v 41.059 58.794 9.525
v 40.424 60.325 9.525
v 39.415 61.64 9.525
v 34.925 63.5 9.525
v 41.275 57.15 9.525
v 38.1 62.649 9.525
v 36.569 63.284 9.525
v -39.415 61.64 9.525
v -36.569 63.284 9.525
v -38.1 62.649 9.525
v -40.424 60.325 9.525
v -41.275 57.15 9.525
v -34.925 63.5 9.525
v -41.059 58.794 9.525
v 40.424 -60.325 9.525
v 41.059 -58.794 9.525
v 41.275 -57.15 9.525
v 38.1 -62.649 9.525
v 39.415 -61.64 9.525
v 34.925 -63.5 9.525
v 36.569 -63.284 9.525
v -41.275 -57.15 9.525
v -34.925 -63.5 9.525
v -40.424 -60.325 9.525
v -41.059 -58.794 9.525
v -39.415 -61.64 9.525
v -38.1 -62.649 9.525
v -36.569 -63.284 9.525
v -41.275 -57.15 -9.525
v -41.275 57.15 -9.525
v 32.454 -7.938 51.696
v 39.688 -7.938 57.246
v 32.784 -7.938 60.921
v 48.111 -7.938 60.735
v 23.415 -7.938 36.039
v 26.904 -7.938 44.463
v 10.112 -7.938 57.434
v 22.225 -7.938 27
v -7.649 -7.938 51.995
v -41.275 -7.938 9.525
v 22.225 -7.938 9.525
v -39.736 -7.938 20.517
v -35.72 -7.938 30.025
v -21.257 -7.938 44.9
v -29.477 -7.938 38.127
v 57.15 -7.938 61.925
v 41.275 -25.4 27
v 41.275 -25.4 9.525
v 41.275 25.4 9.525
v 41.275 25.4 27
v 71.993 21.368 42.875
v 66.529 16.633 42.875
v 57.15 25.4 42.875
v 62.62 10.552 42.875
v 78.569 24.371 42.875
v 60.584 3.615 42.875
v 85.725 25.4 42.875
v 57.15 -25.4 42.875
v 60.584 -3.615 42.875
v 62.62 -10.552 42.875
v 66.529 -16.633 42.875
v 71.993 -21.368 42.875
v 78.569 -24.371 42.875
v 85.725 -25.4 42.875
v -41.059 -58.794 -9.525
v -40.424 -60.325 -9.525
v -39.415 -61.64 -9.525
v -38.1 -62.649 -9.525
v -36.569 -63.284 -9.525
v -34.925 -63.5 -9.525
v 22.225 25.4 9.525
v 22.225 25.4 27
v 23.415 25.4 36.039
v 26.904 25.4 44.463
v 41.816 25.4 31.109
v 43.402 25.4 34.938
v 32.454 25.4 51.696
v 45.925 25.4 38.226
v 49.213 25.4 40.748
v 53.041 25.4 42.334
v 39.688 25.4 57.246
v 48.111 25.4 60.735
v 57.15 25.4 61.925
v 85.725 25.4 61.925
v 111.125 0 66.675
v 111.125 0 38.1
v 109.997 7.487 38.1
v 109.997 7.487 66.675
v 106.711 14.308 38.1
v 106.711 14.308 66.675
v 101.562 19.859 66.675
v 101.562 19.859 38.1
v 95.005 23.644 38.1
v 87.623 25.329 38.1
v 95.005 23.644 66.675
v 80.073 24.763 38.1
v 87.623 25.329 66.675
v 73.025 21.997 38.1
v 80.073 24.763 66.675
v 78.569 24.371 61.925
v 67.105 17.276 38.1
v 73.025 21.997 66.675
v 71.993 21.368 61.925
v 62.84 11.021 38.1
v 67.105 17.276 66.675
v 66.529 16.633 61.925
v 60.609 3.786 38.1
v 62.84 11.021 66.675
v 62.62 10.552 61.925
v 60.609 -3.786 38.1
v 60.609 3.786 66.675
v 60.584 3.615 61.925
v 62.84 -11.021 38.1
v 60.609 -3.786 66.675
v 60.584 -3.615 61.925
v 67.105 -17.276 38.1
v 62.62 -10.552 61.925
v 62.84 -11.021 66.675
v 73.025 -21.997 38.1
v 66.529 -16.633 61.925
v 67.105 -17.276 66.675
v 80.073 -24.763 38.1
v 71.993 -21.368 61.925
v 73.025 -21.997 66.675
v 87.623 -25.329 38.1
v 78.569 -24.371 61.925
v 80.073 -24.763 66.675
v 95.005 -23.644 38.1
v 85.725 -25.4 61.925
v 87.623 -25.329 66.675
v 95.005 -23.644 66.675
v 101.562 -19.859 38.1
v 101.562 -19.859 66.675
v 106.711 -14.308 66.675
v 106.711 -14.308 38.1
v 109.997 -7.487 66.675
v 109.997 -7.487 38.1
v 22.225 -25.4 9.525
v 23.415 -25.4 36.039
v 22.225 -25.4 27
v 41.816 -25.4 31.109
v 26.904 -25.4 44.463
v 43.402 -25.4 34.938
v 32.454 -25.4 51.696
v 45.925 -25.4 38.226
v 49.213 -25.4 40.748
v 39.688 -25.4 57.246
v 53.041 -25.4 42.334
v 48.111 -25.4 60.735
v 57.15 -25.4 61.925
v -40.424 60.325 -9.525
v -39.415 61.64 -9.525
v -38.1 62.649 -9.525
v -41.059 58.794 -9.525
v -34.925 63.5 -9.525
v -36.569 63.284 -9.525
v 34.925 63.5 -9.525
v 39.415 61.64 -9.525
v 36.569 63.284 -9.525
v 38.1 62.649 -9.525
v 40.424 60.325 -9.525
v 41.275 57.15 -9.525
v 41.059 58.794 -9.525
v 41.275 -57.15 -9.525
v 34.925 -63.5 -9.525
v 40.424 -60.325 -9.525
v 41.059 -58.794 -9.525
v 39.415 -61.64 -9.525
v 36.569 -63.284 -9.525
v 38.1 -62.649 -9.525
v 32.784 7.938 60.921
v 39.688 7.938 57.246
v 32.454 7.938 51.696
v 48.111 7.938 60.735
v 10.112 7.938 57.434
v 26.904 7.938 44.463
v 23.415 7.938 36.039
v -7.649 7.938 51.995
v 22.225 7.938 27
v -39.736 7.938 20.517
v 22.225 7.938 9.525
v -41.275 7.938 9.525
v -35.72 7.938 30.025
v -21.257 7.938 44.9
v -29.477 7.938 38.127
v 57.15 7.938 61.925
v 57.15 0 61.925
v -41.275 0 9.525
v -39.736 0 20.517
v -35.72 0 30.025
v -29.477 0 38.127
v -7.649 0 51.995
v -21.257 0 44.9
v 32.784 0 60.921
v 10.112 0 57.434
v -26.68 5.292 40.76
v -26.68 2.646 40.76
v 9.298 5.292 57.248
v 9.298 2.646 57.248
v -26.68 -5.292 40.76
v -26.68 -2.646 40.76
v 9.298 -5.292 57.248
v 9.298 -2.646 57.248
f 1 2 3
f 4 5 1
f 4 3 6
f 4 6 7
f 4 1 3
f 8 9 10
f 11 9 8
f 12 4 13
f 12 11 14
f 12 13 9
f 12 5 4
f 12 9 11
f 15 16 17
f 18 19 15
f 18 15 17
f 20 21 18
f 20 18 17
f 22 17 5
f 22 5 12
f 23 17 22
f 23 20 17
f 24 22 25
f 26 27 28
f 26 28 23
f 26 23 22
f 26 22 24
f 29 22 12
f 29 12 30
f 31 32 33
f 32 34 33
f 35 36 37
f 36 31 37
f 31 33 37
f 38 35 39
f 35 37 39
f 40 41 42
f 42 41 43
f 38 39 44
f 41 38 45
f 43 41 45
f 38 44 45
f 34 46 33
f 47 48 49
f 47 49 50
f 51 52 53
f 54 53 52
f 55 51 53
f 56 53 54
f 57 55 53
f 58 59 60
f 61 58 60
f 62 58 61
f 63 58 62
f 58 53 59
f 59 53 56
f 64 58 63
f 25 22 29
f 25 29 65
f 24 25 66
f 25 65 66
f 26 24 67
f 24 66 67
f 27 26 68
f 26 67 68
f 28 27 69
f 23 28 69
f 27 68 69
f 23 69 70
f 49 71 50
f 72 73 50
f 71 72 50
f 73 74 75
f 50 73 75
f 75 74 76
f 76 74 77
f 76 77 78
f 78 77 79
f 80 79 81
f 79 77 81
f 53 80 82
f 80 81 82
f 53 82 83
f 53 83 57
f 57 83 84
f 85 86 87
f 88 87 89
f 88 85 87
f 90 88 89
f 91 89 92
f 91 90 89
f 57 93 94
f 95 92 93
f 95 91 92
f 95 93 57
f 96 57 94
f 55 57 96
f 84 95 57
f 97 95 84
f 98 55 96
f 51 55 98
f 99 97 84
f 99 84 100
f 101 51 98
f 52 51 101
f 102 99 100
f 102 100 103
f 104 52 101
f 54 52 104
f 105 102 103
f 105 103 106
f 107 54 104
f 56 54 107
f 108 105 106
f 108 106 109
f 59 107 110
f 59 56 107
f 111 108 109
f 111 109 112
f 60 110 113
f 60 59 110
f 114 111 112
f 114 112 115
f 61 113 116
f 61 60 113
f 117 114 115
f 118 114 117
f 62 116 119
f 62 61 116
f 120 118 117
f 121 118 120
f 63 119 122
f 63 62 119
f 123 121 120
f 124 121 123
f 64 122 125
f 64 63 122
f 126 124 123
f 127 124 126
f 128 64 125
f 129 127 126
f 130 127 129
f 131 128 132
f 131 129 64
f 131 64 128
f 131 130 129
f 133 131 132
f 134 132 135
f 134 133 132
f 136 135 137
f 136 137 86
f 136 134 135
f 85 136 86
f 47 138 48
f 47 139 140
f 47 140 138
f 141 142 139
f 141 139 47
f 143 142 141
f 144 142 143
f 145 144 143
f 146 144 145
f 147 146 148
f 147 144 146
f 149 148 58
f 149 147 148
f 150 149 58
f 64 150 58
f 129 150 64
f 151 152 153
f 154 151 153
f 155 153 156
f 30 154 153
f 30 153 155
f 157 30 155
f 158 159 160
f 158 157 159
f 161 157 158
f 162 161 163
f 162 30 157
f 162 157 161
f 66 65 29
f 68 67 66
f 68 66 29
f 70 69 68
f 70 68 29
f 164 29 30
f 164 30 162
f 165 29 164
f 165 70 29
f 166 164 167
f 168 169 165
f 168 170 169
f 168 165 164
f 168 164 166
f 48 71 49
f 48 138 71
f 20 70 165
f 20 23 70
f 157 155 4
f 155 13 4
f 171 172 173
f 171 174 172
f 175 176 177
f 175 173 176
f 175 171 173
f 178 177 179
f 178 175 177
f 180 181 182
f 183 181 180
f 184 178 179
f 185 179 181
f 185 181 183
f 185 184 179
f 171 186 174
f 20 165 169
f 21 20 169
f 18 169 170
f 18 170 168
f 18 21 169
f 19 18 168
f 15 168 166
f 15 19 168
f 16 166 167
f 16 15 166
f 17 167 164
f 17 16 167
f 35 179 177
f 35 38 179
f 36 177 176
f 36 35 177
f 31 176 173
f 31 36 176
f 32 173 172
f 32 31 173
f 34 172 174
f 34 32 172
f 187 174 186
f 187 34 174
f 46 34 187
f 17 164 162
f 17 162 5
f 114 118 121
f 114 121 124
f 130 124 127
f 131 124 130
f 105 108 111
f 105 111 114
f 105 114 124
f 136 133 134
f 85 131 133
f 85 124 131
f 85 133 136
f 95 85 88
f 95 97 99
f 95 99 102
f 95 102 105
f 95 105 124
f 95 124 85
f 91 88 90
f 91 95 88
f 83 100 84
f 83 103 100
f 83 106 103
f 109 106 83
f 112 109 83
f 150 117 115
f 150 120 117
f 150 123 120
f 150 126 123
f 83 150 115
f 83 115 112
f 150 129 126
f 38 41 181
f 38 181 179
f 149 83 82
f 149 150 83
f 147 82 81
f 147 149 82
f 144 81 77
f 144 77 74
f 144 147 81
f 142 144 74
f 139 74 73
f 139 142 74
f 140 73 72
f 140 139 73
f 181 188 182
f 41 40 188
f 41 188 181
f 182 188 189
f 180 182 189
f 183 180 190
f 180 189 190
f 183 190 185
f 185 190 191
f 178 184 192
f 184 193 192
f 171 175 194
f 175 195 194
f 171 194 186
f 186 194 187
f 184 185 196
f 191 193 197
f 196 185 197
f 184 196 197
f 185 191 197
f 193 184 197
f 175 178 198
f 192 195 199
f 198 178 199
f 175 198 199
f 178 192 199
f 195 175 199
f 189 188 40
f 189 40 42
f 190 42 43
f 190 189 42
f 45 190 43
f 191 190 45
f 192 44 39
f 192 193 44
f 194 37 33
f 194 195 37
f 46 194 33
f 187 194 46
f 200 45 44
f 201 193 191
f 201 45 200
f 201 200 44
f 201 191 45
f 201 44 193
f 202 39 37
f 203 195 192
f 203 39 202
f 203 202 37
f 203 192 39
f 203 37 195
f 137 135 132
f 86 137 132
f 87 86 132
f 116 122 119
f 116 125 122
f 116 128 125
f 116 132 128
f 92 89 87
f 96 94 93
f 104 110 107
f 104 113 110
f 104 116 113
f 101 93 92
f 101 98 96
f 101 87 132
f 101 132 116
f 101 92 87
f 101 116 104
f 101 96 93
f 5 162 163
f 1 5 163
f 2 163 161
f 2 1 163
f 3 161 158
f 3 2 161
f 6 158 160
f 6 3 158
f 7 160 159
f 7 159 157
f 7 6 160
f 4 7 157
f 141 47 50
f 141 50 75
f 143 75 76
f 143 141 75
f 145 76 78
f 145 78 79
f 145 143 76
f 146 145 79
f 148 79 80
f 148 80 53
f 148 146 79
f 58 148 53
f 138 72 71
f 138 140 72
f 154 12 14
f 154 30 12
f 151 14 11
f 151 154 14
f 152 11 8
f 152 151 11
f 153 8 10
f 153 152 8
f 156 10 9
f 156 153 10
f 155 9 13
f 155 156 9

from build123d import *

# Parameters (mm, degrees)
F1_DEPTH = 63.5
F2_DEPTH = 7.9375
F0_W     = 25.4
F0_H     = 19.05
F3_DEPTH = 25.4
F5_R     = 6.35


with BuildPart() as f1:
    # F0 (on Front) → F1 (new body, symmetric)
    with BuildSketch(Plane.XZ):
        Polygon((-41.275, -9.525), (41.275, -9.525), (41.275, 9.525), (22.225, 9.525), (-41.275, 9.525), align=None)
    extrude(amount=F1_DEPTH, both=True)

    # F5
    f5_edges = [f1.edges().sort_by_distance(p)[0] for p in [
        (41.275, -63.5, 0),
        (-41.275, -63.5, 0),
        (41.275, 63.5, 0),
        (-41.275, 63.5, 0),
    ]]
    fillet(f5_edges, radius=F5_R)


with BuildPart() as f2:
    # F0 (on Front) → F2 (new body, symmetric)
    with BuildSketch(Plane.XZ):
        with BuildLine():
            add(Edge.make_bspline(
                [(-41.275, 9.525), (-40.5419133604, 49.1128563881), (6.5302411094, 62.1733367443), (57.15, 61.9252)],
                knots=[0, 0, 0, 0, 111.5045361635, 111.5045361635, 111.5045361635, 111.5045361635], degree=3))
            Line((-41.275, 9.525), (22.225, 9.525))
            Line((22.225, 9.525), (22.225, 27.0002))
            ThreePointArc((22.225, 27.0002), (32.4542956671, 51.6959043329), (57.15, 61.9252))
        make_face()
    extrude(amount=F2_DEPTH, both=True)


with BuildPart() as f3:
    # F0 (on Front) → F3 (new body, symmetric)
    with BuildSketch(Plane.XZ):
        with BuildLine():
            Line((22.225, 9.525), (41.275, 9.525))
            Line((41.275, 9.525), (41.275, 27.0002))
            ThreePointArc((41.275, 27.0002), (45.9246798487, 38.2255201513), (57.15, 42.8752))
            Line((57.15, 42.8752), (60.325, 42.8752))
            Line((60.325, 42.8752), (60.325, 61.9252))
            Line((60.325, 61.9252), (57.15, 61.9252))
            ThreePointArc((57.15, 61.9252), (32.4542956671, 51.6959043329), (22.225, 27.0002))
            Line((22.225, 27.0002), (22.225, 9.525))
        make_face()
        with Locations((73.025, 52.4002)):
            Rectangle(F0_W, F0_H)
    extrude(amount=F3_DEPTH, both=True)

    # F0 (on Front) → F4 (revolve)
    with BuildSketch(Plane.XZ):
        Polygon((85.725, 66.675), (85.725, 61.9252), (85.725, 42.8752), (85.725, 38.1), (111.125, 38.1), (111.125, 66.675), align=None)
    revolve(axis=Axis((85.725, 0, 52.3875), (0, 0, 1)))


solid = Compound([f1.part, f2.part, f3.part])
